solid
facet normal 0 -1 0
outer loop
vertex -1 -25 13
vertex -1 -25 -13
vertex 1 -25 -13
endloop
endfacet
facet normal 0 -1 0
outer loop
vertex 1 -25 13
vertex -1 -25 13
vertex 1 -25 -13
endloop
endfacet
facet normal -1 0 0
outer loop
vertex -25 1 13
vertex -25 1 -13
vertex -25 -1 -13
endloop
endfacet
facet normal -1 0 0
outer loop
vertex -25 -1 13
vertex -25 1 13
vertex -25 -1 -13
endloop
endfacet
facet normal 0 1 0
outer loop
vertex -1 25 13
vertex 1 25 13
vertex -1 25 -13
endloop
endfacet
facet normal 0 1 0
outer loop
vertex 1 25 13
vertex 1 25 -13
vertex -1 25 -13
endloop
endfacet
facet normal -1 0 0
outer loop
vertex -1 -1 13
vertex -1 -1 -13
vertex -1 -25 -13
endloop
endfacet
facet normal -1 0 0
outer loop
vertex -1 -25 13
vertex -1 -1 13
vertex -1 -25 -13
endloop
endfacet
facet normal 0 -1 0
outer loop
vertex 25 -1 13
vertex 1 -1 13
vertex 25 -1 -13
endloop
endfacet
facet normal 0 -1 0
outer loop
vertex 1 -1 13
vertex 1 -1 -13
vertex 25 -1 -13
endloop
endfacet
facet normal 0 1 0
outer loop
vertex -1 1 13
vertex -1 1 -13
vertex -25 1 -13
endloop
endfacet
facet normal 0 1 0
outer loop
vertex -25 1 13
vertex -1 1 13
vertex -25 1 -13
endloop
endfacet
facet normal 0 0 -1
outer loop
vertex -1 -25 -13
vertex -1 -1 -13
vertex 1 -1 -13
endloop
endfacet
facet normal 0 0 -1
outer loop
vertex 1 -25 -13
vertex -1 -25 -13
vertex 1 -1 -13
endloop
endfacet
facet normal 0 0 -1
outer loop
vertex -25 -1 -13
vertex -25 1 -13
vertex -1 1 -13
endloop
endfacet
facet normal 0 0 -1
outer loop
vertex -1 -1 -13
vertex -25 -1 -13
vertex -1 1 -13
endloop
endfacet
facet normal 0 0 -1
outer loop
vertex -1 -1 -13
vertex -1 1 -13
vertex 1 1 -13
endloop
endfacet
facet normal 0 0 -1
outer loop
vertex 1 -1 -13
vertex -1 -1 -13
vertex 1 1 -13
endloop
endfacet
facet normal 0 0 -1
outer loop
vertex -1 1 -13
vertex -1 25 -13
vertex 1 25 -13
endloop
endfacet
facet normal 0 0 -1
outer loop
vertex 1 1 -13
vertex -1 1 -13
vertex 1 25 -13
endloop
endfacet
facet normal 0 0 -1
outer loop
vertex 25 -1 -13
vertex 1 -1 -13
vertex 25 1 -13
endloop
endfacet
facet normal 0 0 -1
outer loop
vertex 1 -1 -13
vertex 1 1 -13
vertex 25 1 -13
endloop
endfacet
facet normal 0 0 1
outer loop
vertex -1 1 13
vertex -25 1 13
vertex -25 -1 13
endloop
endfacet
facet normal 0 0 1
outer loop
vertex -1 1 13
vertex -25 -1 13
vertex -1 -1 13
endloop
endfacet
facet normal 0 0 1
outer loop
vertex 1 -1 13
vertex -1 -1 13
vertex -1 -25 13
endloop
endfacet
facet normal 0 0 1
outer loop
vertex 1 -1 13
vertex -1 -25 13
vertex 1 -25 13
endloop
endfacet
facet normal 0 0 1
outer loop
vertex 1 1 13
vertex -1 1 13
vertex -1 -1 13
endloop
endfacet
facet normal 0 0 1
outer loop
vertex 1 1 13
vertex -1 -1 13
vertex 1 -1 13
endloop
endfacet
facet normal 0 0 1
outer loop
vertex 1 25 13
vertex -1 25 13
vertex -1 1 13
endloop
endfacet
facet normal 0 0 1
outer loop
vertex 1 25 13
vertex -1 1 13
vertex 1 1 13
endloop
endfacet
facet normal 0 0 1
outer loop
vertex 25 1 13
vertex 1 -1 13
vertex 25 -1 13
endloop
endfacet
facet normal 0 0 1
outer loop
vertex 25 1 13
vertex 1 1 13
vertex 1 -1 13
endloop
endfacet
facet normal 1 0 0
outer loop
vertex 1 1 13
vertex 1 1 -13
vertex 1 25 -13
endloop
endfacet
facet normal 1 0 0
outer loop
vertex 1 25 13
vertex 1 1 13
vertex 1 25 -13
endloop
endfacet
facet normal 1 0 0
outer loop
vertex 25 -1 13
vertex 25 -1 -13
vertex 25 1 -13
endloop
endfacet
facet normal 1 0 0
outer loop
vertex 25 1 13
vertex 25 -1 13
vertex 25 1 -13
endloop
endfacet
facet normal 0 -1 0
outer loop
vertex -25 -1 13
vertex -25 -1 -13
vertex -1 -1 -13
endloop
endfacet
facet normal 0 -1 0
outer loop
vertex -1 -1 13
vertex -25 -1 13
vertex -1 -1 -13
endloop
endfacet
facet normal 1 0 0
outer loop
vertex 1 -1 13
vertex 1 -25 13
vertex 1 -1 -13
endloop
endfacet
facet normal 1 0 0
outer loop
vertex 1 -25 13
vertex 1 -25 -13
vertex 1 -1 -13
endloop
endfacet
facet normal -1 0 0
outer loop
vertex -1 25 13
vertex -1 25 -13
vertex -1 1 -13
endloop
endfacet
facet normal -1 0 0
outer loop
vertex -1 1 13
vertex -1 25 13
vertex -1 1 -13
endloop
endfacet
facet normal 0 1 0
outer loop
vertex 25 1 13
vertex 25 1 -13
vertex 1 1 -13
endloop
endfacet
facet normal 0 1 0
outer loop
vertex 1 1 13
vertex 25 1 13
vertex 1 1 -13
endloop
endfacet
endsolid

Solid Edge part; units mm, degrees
sketch "Sketch1" plane through (0, 0, 0) normal (0, 0, 1) x (1, 0, 0)
  line L0 (-1, -25) -> (1, -25)
  line L1 (1, -25) -> (1, 25)
  line L2 (1, 25) -> (-1, 25)
  line L3 (-1, 25) -> (-1, -25)
  line L4 (-25, -1) -> (25, -1)
  line L5 (25, -1) -> (25, 1)
  line L6 (25, 1) -> (-25, 1)
  line L7 (-25, 1) -> (-25, -1)
extrude "Protrusion1" add sketch "Sketch1" along normal mid plane 26
